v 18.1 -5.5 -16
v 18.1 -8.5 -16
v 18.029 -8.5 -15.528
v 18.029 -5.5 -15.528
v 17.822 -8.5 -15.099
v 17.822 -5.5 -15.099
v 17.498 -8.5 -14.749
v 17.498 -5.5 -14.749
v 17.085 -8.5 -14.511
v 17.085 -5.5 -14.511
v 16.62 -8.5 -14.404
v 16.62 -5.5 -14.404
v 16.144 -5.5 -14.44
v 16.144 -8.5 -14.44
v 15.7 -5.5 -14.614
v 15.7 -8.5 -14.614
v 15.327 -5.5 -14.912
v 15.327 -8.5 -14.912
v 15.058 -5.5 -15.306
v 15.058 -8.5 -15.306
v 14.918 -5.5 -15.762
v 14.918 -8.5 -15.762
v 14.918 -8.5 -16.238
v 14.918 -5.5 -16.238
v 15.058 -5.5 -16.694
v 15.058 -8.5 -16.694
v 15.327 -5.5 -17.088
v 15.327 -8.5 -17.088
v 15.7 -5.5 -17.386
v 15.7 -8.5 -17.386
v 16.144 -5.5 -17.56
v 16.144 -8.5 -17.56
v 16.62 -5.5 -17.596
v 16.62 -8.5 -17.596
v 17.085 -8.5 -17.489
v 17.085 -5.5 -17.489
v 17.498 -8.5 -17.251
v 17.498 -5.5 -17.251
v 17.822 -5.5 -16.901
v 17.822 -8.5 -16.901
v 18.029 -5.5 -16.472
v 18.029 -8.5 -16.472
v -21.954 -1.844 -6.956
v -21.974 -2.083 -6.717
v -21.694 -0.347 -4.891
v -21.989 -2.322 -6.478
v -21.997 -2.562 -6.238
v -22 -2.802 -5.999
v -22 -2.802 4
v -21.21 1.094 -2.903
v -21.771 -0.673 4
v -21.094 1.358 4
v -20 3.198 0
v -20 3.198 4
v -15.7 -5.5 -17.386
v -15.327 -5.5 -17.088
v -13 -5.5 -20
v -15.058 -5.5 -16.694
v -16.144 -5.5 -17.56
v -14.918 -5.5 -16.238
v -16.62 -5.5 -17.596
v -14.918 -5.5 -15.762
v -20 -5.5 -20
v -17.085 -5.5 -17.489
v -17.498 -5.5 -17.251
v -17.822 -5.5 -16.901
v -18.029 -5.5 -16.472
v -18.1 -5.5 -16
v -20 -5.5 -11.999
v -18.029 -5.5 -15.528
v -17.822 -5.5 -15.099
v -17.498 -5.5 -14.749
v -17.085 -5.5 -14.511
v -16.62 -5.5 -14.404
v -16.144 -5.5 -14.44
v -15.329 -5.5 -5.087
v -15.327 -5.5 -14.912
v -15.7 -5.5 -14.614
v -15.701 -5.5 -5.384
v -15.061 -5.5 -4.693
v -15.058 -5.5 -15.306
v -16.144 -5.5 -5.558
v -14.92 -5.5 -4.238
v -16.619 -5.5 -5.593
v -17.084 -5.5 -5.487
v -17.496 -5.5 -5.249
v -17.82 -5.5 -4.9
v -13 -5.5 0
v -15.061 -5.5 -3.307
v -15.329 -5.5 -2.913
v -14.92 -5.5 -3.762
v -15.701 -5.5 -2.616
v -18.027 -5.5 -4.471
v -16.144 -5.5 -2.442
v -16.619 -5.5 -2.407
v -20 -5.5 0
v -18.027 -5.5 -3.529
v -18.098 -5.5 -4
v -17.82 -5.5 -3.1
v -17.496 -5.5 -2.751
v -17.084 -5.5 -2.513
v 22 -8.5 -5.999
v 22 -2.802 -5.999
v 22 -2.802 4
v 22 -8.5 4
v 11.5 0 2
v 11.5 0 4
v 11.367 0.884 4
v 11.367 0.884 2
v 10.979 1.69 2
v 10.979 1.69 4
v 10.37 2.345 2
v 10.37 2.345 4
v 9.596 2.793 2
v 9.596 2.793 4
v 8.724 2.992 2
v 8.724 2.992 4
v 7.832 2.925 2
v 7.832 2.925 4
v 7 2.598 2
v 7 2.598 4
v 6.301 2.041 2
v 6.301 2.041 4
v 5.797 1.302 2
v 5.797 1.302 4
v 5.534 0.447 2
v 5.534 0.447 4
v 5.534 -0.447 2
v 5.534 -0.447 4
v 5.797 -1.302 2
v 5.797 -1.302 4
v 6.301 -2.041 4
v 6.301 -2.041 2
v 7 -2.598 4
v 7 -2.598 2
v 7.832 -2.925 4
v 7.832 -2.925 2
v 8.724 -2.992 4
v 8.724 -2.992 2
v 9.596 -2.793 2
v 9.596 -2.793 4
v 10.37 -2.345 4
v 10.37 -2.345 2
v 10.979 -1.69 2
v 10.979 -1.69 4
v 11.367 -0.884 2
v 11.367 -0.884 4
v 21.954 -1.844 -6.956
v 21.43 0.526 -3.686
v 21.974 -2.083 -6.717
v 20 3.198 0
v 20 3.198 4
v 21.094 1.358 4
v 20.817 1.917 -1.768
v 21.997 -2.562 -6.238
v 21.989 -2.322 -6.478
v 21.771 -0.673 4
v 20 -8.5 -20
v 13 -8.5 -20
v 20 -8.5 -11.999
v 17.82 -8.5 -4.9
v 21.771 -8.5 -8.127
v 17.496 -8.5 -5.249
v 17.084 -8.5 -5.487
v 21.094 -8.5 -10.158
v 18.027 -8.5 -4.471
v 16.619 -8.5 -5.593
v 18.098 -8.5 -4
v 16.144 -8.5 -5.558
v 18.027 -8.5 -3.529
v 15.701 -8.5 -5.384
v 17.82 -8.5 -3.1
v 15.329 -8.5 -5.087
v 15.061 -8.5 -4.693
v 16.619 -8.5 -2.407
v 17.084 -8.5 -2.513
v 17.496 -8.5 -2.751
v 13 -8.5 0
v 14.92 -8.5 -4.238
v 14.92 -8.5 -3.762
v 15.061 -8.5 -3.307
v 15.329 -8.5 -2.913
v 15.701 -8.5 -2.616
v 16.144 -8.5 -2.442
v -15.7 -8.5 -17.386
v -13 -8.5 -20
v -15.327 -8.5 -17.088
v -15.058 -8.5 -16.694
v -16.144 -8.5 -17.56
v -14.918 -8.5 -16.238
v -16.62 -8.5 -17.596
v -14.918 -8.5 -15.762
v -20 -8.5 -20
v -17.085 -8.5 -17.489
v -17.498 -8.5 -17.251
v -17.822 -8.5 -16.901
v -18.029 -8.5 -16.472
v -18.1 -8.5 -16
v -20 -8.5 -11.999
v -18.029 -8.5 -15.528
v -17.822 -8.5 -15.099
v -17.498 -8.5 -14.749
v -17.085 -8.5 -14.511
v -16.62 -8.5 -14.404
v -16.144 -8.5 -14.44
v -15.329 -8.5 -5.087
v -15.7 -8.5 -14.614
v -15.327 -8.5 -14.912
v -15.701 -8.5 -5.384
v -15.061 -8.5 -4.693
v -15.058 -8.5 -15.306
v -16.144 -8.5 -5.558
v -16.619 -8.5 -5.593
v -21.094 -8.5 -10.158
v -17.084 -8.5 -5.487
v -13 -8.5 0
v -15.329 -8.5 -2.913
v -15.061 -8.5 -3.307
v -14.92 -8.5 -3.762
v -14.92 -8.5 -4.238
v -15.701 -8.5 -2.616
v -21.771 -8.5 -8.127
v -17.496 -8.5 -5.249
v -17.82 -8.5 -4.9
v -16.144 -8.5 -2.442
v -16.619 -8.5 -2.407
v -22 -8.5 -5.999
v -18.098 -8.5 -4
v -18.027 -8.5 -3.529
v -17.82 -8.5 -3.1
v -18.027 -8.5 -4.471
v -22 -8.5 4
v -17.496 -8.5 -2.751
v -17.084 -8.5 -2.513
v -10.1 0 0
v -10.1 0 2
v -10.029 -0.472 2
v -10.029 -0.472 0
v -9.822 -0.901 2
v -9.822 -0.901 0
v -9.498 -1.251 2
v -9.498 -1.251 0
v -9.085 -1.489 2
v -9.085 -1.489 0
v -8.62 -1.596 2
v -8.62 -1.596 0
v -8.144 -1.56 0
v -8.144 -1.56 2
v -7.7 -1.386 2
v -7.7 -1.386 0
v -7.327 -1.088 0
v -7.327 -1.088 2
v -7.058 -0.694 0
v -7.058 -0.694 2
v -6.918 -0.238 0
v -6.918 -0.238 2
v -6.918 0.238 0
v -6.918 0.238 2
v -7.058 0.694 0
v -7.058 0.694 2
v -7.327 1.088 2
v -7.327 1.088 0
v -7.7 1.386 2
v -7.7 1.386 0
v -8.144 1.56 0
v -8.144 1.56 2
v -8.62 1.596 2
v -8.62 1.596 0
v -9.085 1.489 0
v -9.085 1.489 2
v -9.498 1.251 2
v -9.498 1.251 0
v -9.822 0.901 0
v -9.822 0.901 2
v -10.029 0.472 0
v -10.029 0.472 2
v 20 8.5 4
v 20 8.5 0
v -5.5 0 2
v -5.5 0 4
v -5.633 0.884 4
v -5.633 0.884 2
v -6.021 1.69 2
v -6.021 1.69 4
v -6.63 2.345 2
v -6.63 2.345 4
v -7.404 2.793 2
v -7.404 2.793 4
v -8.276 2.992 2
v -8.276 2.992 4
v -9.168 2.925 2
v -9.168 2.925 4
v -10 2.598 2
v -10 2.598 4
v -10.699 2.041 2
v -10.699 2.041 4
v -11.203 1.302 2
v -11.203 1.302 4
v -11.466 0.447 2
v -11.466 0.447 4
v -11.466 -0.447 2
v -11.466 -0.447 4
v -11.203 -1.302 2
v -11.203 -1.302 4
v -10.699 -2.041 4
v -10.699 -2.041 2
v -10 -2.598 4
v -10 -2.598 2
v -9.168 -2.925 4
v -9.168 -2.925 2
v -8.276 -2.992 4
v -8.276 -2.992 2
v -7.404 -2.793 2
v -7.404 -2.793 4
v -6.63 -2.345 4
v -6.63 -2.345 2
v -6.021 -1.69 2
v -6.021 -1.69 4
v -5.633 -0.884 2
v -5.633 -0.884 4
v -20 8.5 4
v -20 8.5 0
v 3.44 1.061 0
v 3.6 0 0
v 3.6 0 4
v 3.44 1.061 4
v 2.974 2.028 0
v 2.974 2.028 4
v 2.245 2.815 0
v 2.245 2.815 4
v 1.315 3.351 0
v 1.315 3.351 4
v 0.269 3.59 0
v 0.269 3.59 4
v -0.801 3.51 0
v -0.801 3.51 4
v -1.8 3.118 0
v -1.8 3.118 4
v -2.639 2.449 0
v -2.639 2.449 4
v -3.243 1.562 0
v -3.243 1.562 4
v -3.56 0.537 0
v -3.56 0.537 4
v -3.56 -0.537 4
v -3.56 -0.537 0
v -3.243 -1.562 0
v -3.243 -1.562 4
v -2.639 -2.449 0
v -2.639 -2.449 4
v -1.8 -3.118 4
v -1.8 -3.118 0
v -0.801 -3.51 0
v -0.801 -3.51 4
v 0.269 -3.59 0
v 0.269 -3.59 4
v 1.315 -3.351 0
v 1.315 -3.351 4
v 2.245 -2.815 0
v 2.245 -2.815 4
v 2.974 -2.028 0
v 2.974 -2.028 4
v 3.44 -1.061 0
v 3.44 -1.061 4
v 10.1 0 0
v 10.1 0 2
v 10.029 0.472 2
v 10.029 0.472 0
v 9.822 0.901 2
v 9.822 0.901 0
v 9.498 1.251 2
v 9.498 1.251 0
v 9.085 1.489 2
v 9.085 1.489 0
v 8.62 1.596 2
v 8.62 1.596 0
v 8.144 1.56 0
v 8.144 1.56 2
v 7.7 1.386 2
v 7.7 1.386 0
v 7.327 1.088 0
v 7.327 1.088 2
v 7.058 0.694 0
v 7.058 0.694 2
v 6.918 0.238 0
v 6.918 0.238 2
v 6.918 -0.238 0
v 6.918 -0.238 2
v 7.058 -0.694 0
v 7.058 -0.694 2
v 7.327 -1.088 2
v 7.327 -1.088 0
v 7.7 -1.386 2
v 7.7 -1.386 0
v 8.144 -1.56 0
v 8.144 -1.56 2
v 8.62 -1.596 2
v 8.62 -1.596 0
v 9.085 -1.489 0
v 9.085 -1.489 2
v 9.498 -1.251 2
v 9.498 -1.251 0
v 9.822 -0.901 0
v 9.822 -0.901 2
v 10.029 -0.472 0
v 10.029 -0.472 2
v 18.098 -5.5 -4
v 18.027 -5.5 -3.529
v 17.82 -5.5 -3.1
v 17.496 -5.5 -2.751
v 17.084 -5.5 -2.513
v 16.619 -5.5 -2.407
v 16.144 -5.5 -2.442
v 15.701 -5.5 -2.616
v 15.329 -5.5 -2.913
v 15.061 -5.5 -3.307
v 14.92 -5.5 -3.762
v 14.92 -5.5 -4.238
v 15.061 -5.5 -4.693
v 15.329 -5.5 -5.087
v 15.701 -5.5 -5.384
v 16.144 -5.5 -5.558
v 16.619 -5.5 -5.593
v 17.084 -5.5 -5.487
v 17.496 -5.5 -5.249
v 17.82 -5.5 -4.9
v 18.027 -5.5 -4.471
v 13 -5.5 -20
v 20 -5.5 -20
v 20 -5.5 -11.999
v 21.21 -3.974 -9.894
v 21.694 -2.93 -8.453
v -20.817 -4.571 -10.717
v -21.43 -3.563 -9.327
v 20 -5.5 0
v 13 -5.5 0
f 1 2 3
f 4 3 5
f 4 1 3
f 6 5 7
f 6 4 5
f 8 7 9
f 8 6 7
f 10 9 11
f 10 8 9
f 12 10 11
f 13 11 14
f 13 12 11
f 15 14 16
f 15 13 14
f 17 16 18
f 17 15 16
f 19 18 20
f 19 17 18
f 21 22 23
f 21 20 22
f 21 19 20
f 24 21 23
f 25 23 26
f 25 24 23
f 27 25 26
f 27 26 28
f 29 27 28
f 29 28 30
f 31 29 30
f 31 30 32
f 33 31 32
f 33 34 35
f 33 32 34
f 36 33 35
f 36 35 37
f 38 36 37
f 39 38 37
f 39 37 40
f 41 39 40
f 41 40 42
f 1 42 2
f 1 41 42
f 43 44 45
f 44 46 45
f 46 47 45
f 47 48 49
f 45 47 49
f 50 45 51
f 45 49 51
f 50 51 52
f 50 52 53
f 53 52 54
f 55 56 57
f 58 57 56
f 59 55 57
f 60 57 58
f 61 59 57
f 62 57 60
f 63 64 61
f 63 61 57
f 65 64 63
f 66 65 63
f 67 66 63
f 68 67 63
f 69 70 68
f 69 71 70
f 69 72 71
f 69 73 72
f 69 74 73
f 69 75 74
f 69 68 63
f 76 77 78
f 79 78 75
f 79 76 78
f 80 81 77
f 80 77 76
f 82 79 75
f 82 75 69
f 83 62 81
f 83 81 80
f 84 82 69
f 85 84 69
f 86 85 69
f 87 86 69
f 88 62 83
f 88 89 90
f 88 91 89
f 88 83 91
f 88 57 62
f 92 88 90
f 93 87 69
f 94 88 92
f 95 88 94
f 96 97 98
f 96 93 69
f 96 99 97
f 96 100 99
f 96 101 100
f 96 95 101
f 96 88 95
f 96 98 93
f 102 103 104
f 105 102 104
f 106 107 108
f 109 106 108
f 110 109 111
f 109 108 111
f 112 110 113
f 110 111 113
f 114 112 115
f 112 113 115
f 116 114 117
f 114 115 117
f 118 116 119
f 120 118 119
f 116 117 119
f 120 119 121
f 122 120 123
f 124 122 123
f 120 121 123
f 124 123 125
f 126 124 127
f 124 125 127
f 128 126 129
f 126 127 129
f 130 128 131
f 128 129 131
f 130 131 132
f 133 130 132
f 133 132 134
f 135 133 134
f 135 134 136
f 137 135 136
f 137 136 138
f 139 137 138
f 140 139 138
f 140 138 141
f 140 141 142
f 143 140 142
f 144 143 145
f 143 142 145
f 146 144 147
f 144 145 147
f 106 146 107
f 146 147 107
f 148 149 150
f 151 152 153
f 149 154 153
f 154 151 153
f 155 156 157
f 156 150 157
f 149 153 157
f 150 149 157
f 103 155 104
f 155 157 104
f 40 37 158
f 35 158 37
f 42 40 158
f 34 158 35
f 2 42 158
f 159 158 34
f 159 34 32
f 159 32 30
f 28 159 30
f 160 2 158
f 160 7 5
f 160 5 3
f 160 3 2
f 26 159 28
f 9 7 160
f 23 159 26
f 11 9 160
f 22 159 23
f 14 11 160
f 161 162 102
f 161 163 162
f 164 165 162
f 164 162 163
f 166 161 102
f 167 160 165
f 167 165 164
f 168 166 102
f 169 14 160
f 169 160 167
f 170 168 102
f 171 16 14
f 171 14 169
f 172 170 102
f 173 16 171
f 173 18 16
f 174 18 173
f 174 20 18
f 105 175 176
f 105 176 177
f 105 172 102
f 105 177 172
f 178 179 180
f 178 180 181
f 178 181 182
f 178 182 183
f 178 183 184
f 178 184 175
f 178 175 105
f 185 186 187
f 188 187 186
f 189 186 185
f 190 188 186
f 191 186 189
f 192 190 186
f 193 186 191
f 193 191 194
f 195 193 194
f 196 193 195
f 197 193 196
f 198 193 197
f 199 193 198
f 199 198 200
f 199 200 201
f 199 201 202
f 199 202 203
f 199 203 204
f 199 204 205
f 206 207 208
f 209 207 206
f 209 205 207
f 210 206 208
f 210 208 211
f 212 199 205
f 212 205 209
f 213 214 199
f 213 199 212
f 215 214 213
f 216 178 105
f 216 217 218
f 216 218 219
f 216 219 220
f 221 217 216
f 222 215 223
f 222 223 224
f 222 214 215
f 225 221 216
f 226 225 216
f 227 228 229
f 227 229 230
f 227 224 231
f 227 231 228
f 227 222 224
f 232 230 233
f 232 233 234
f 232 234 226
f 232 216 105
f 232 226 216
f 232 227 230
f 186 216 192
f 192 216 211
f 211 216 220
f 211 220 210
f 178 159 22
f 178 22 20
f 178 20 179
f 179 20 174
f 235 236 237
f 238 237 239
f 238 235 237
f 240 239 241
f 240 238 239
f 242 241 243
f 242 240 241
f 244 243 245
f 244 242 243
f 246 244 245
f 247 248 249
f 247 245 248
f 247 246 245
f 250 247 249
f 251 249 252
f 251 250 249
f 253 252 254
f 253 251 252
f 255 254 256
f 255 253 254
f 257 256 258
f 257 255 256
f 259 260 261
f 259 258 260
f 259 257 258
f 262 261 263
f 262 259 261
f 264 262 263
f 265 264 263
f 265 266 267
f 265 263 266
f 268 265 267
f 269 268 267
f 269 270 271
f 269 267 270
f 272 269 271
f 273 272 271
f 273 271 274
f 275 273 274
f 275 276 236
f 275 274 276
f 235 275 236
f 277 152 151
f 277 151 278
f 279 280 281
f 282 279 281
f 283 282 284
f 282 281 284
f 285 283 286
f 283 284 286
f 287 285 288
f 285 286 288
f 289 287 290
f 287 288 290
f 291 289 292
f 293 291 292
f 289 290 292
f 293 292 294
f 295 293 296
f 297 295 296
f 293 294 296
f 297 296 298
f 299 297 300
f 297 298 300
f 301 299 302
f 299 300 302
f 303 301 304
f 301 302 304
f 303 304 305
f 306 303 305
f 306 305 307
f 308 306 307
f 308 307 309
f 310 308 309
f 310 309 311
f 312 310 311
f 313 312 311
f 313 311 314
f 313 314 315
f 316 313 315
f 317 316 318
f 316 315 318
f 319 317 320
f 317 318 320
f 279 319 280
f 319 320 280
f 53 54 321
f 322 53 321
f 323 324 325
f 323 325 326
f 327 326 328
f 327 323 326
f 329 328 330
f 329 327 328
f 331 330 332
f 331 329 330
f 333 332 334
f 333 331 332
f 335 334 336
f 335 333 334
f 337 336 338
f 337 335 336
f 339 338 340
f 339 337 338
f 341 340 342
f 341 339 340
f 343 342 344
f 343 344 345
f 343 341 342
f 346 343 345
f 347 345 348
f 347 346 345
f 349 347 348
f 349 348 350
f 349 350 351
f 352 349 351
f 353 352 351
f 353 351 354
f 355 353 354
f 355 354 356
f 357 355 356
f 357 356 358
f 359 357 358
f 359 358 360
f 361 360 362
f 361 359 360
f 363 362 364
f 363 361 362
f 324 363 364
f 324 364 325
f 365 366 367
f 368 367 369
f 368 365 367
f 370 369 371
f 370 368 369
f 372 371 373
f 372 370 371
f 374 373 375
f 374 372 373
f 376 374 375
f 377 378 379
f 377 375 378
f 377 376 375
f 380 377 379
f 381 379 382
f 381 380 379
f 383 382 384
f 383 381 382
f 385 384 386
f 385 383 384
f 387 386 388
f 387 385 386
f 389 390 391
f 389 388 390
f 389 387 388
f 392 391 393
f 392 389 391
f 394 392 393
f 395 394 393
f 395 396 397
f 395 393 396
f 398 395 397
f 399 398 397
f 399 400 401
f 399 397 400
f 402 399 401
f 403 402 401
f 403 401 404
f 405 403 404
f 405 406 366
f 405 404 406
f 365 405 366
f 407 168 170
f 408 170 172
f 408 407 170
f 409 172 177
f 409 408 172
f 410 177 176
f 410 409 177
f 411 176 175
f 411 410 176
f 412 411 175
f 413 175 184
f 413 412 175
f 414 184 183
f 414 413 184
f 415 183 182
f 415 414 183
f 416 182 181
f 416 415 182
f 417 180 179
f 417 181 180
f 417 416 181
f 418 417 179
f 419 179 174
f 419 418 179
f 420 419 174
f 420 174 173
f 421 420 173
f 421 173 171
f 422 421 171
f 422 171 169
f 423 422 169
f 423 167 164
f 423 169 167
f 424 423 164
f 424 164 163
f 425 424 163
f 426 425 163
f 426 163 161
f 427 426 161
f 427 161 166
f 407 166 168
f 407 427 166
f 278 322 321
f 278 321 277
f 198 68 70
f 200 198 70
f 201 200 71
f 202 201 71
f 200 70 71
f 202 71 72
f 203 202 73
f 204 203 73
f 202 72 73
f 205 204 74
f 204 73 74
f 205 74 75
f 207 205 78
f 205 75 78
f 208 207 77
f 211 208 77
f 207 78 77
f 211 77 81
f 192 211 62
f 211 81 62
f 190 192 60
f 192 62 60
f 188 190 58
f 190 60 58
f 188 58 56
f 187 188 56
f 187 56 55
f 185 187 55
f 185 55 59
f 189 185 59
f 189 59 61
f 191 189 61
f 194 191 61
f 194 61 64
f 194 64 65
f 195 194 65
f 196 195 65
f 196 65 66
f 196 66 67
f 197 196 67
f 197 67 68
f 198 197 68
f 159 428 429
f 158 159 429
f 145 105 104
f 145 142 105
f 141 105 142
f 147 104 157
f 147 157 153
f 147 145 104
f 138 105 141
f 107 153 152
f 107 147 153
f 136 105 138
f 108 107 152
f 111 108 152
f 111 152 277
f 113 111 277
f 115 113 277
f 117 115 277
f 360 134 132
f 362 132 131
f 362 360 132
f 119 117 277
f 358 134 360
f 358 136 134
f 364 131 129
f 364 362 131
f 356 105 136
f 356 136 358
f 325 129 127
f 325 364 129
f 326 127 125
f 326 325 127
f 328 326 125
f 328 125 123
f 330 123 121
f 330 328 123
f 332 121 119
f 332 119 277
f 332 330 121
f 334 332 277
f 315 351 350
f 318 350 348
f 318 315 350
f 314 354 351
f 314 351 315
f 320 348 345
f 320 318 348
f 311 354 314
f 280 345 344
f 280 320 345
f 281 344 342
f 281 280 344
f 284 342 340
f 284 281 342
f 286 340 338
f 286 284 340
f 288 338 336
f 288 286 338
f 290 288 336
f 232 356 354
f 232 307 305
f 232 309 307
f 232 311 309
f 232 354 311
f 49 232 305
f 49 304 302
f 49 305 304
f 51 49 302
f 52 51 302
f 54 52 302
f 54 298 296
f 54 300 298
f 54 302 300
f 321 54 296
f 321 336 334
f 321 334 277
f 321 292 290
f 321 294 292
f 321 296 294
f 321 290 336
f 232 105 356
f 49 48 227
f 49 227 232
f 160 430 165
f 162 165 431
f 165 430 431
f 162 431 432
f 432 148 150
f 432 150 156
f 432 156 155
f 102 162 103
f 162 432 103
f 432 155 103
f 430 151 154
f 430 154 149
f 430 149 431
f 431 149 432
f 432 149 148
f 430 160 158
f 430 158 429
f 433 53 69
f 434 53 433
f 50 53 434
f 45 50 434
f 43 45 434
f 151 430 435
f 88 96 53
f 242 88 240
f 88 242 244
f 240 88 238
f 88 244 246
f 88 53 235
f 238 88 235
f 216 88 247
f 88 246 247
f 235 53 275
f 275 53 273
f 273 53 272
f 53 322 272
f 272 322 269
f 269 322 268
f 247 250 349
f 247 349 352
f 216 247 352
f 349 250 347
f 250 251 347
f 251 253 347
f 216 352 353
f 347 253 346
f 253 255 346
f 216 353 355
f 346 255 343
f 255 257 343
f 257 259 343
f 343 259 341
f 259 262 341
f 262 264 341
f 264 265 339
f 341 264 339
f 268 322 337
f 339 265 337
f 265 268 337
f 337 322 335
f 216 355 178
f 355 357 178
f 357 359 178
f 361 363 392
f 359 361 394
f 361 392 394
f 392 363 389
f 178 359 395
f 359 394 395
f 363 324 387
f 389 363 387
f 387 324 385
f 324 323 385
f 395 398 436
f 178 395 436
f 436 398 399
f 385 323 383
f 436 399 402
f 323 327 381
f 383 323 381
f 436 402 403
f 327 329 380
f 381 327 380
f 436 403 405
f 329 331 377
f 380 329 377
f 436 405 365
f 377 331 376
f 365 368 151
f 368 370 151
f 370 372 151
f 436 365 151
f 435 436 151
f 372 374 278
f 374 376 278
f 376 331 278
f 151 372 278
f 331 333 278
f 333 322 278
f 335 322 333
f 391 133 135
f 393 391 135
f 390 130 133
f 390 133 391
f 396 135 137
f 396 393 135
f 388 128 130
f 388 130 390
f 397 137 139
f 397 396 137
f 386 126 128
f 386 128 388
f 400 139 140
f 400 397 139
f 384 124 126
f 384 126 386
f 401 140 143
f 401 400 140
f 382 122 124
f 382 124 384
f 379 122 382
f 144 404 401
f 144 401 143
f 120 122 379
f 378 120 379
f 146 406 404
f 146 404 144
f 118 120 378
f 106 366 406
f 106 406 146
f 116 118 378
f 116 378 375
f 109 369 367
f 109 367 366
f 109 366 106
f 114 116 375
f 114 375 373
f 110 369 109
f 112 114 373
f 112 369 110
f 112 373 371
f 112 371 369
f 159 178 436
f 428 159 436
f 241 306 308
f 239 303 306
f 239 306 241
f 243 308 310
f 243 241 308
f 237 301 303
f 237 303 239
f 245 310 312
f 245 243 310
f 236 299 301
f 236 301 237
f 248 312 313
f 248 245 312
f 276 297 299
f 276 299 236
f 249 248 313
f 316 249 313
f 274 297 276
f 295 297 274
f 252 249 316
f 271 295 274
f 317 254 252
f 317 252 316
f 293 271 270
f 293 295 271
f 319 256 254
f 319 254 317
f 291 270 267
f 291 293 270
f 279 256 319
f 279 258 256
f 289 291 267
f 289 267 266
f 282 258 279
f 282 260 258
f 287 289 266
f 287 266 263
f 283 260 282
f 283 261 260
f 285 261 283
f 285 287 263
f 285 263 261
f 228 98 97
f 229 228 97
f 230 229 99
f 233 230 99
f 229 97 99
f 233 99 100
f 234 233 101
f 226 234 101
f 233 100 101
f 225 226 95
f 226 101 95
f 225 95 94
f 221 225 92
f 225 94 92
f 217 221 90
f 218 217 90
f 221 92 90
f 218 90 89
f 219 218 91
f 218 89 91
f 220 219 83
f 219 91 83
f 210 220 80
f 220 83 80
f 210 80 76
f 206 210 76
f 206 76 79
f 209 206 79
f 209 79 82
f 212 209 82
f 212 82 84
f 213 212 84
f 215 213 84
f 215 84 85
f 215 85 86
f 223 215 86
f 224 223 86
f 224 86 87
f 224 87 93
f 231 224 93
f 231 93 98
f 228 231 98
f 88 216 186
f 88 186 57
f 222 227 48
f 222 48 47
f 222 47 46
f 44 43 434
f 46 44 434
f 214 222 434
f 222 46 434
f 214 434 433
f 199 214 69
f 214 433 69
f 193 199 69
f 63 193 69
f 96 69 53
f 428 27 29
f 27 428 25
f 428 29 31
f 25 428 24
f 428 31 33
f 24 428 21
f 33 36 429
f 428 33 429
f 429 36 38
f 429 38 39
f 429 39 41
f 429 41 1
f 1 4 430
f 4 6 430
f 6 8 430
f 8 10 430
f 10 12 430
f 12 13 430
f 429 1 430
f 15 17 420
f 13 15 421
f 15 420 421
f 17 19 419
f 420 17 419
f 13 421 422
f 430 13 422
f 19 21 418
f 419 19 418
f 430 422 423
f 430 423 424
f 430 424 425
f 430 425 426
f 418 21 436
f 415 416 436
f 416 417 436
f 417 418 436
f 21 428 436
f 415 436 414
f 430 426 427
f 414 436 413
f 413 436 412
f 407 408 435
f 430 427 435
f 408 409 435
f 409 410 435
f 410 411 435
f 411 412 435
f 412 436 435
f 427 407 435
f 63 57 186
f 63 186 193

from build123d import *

# Parameters (mm, degrees)
SKETCH1_W            = 40
SKETCH1_H            = 17
SKETCH1_R            = 3.6
SKETCH1_R_2          = 1.6
BOSS_EXTRUDE1_DEPTH  = 4
SKETCH2_W            = 7
SKETCH2_H            = 3
BOSS_EXTRUDE2_DEPTH  = 20
SKETCH3_R            = 1.597664911
SKETCH3_R_2          = 1.6
CUT_EXTRUDE1_DEPTH   = 20
BOSS_EXTRUDE3_DEPTH  = 2
FILLET1_R            = 10
FILLET1_OF_MIRROR1_R = 10
SKETCH5_R            = 3
CUT_EXTRUDE2_DEPTH   = 2


with BuildPart() as part:
    # Sketch1 → Boss-Extrude1 (new body)
    with BuildSketch(Plane.XY):
        Rectangle(SKETCH1_W, SKETCH1_H)
        Circle(SKETCH1_R, mode=Mode.SUBTRACT)
        with Locations((8.5, 0)):
            Circle(SKETCH1_R_2, mode=Mode.SUBTRACT)
        with Locations(Location((-8.5, 0, 0), (0, 0, 180))):
            Circle(SKETCH1_R_2, mode=Mode.SUBTRACT)
    extrude(amount=BOSS_EXTRUDE1_DEPTH)

    # Sketch2 → Boss-Extrude2 (add)
    with BuildSketch(Plane(origin=(0, 0, 0), x_dir=(-1, 0, 0), z_dir=(0, 0, -1))):
        with Locations((16.5, -7)):
            Rectangle(SKETCH2_W, SKETCH2_H)
    boss_extrude2 = extrude(amount=BOSS_EXTRUDE2_DEPTH)

    # Sketch3 → Cut-Extrude1 (cut)
    with BuildSketch(Plane(origin=(0, -5.5, 0), x_dir=(1, 0, 0), z_dir=(0, 1, 0))):
        with Locations(Location((-16.5, 4, 0), (0, 0, 180))):
            Circle(SKETCH3_R)
        with Locations(Location((-16.5, 16, 0), (0, 0, 180))):
            Circle(SKETCH3_R_2)
    cut_extrude1 = extrude(amount=-CUT_EXTRUDE1_DEPTH, mode=Mode.SUBTRACT)

    # Sketch4 → Boss-Extrude3 (add)
    with BuildSketch(Plane.ZY.offset(20)):
        Polygon((0, 3.19845738), (-11.998610201, -5.5), (-11.998610201, -8.5), (4, -8.5), (4, 3.19845738), align=None)
    boss_extrude3 = extrude(amount=BOSS_EXTRUDE3_DEPTH)

    # Fillet1
    # the kernel refuses this fillet: 10 mm, written as the material it takes off along each edge
    with BuildSketch(Plane(origin=(-22, 9.5, -11.998610201), x_dir=(0, 0, 1), z_dir=(0, -1, 0))) as fillet1_piece_1:
        with BuildLine():
            CenterArc((6, -10), FILLET1_R, 90, 36.869897646)
            Line((0, -2), (-0.12, -1.84))
            ThreePointArc((-0.12, -1.84), (-0.2, -1), (-0.2, 0))
            Line((-0.2, 0), (0, 0.2))
            Line((0, 0.2), (6, 0.2))
            Line((6, 0.2), (6, 0))
        make_face()
    extrude(amount=33, mode=Mode.SUBTRACT)
    with BuildSketch(Plane(origin=(-22, 3.19845738, 19), x_dir=(1, 0, 0), z_dir=(0, 0, -1))) as fillet1_piece_2:
        with BuildLine():
            CenterArc((10, 6), FILLET1_R, 180, 36.869897646)
            Line((0, 6), (-0.2, 6))
            Line((-0.2, 6), (-0.2, 0))
            Line((-0.2, 0), (0, -0.2))
            ThreePointArc((0, -0.2), (1, -0.2), (1.84, -0.12))
            Line((1.84, -0.12), (2, 0))
        make_face()
    extrude(amount=34, mode=Mode.SUBTRACT)

    # Mirror1: Boss-Extrude2, Cut-Extrude1, Boss-Extrude3 across plane
    add(boss_extrude2.mirror(Plane(origin=(0, 0, 0), x_dir=(0, 0, 1), z_dir=(1, 0, 0))))
    add(cut_extrude1.mirror(Plane(origin=(0, 0, 0), x_dir=(0, 0, 1), z_dir=(1, 0, 0))), mode=Mode.SUBTRACT)
    add(boss_extrude3.mirror(Plane(origin=(0, 0, 0), x_dir=(0, 0, 1), z_dir=(1, 0, 0))))

    # Fillet1 of Mirror1
    # the kernel refuses this fillet: 10 mm, written as the material it takes off along each edge
    with BuildSketch(Plane(origin=(22, 9.5, -11.998610201), x_dir=(-1, 0, 0), z_dir=(0, -1, 0))) as fillet1_of_mirror1_piece_1:
        with BuildLine():
            CenterArc((10, -6), FILLET1_OF_MIRROR1_R, 143.130102354, 36.869897646)
            Line((0, -6), (-0.2, -6))
            Line((-0.2, -6), (-0.2, 0))
            Line((-0.2, 0), (0, 0.2))
            ThreePointArc((0, 0.2), (1, 0.2), (1.84, 0.12))
            Line((1.84, 0.12), (2, 0))
        make_face()
    extrude(amount=33, mode=Mode.SUBTRACT)
    with BuildSketch(Plane(origin=(22, 3.19845738, 19), x_dir=(-1, 0, 0), z_dir=(0, 0, -1))) as fillet1_of_mirror1_piece_2:
        with BuildLine():
            CenterArc((10, -6), FILLET1_OF_MIRROR1_R, 143.130102354, 36.869897646)
            Line((0, -6), (-0.2, -6))
            Line((-0.2, -6), (-0.2, 0))
            Line((-0.2, 0), (0, 0.2))
            ThreePointArc((0, 0.2), (1, 0.2), (1.84, 0.12))
            Line((1.84, 0.12), (2, 0))
        make_face()
    extrude(amount=34, mode=Mode.SUBTRACT)

    # Sketch5 → Cut-Extrude2 (cut)
    with BuildSketch(Plane.XY.offset(4)):
        with Locations((-8.5, 0)):
            Circle(SKETCH5_R)
        with Locations((8.5, 0)):
            Circle(SKETCH5_R)
    extrude(amount=-CUT_EXTRUDE2_DEPTH, mode=Mode.SUBTRACT)


solid = part.part
